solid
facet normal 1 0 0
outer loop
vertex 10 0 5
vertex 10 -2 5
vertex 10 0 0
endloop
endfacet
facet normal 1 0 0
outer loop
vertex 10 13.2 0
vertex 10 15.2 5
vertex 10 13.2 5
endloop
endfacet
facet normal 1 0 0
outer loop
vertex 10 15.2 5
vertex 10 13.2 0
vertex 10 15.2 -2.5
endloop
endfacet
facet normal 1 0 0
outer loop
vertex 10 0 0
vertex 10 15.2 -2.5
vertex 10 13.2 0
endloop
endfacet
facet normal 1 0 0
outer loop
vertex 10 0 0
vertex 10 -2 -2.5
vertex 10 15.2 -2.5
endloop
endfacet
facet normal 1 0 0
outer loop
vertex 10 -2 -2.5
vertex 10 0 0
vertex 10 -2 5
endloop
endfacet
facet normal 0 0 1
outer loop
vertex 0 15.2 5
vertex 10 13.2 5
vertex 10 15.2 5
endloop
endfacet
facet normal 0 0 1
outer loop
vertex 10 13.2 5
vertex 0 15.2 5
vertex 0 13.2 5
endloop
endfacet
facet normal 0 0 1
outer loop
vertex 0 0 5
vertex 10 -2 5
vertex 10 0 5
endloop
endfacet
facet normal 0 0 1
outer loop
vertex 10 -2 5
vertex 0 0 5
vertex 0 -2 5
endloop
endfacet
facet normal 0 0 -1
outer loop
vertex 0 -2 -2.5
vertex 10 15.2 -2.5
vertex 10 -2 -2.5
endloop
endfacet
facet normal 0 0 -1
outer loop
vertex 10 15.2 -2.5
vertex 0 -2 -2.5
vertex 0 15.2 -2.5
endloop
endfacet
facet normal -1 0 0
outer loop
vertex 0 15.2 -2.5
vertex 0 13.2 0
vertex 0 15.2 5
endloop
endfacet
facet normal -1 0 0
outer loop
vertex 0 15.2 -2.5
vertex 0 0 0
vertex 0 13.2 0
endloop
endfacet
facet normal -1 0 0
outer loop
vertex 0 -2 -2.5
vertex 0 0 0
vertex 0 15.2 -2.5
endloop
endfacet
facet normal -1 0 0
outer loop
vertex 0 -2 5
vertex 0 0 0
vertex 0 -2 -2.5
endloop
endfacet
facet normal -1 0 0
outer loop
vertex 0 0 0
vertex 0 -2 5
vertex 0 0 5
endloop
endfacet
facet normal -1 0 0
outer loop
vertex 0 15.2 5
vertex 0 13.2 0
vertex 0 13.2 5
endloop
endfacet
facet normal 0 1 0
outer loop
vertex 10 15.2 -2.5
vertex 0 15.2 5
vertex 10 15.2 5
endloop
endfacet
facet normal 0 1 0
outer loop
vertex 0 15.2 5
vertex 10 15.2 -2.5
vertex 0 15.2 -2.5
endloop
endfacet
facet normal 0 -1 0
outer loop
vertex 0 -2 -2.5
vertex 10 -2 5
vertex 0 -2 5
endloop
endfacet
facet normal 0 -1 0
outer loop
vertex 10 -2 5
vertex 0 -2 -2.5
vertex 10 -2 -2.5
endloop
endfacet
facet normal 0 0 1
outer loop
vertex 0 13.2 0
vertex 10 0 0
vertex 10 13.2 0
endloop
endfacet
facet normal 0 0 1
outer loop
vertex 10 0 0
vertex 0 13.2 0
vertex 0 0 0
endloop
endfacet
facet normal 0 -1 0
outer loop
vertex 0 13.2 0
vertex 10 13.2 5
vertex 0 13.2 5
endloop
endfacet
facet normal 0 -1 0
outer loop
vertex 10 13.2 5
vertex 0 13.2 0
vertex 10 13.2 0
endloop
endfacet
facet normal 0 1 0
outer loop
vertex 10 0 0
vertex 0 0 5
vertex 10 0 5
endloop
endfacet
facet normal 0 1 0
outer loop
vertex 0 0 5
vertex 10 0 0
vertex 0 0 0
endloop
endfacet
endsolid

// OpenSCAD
include <MCAD/units.scad>

// use $fa=1 and $fs=1.5 during design phase
// and 0.5 when done
$fa=0.5;   	// default minimum facet angle
$fs=0.5; 	// default minimum facet size

epsilon = 0.1*mm; // small tolerance used for CSG subtraction/addition
	
// mdf plate
mdfDepth = 12.7*mm;
thickness = mdfDepth + 0.5;

sideMargin = 2*mm;
bottomMargin = 2.5*mm;
height = 5 + bottomMargin;
length = 10*mm;

module HeightAdjuster() {
    
    difference() {
        translate([0,-sideMargin,-bottomMargin]) cube(size=[length,thickness+2*sideMargin,height]);	
        translate([-epsilon,0,0]) cube(size=[length+2*epsilon,thickness,height]);	
		
    }
}

HeightAdjuster();
